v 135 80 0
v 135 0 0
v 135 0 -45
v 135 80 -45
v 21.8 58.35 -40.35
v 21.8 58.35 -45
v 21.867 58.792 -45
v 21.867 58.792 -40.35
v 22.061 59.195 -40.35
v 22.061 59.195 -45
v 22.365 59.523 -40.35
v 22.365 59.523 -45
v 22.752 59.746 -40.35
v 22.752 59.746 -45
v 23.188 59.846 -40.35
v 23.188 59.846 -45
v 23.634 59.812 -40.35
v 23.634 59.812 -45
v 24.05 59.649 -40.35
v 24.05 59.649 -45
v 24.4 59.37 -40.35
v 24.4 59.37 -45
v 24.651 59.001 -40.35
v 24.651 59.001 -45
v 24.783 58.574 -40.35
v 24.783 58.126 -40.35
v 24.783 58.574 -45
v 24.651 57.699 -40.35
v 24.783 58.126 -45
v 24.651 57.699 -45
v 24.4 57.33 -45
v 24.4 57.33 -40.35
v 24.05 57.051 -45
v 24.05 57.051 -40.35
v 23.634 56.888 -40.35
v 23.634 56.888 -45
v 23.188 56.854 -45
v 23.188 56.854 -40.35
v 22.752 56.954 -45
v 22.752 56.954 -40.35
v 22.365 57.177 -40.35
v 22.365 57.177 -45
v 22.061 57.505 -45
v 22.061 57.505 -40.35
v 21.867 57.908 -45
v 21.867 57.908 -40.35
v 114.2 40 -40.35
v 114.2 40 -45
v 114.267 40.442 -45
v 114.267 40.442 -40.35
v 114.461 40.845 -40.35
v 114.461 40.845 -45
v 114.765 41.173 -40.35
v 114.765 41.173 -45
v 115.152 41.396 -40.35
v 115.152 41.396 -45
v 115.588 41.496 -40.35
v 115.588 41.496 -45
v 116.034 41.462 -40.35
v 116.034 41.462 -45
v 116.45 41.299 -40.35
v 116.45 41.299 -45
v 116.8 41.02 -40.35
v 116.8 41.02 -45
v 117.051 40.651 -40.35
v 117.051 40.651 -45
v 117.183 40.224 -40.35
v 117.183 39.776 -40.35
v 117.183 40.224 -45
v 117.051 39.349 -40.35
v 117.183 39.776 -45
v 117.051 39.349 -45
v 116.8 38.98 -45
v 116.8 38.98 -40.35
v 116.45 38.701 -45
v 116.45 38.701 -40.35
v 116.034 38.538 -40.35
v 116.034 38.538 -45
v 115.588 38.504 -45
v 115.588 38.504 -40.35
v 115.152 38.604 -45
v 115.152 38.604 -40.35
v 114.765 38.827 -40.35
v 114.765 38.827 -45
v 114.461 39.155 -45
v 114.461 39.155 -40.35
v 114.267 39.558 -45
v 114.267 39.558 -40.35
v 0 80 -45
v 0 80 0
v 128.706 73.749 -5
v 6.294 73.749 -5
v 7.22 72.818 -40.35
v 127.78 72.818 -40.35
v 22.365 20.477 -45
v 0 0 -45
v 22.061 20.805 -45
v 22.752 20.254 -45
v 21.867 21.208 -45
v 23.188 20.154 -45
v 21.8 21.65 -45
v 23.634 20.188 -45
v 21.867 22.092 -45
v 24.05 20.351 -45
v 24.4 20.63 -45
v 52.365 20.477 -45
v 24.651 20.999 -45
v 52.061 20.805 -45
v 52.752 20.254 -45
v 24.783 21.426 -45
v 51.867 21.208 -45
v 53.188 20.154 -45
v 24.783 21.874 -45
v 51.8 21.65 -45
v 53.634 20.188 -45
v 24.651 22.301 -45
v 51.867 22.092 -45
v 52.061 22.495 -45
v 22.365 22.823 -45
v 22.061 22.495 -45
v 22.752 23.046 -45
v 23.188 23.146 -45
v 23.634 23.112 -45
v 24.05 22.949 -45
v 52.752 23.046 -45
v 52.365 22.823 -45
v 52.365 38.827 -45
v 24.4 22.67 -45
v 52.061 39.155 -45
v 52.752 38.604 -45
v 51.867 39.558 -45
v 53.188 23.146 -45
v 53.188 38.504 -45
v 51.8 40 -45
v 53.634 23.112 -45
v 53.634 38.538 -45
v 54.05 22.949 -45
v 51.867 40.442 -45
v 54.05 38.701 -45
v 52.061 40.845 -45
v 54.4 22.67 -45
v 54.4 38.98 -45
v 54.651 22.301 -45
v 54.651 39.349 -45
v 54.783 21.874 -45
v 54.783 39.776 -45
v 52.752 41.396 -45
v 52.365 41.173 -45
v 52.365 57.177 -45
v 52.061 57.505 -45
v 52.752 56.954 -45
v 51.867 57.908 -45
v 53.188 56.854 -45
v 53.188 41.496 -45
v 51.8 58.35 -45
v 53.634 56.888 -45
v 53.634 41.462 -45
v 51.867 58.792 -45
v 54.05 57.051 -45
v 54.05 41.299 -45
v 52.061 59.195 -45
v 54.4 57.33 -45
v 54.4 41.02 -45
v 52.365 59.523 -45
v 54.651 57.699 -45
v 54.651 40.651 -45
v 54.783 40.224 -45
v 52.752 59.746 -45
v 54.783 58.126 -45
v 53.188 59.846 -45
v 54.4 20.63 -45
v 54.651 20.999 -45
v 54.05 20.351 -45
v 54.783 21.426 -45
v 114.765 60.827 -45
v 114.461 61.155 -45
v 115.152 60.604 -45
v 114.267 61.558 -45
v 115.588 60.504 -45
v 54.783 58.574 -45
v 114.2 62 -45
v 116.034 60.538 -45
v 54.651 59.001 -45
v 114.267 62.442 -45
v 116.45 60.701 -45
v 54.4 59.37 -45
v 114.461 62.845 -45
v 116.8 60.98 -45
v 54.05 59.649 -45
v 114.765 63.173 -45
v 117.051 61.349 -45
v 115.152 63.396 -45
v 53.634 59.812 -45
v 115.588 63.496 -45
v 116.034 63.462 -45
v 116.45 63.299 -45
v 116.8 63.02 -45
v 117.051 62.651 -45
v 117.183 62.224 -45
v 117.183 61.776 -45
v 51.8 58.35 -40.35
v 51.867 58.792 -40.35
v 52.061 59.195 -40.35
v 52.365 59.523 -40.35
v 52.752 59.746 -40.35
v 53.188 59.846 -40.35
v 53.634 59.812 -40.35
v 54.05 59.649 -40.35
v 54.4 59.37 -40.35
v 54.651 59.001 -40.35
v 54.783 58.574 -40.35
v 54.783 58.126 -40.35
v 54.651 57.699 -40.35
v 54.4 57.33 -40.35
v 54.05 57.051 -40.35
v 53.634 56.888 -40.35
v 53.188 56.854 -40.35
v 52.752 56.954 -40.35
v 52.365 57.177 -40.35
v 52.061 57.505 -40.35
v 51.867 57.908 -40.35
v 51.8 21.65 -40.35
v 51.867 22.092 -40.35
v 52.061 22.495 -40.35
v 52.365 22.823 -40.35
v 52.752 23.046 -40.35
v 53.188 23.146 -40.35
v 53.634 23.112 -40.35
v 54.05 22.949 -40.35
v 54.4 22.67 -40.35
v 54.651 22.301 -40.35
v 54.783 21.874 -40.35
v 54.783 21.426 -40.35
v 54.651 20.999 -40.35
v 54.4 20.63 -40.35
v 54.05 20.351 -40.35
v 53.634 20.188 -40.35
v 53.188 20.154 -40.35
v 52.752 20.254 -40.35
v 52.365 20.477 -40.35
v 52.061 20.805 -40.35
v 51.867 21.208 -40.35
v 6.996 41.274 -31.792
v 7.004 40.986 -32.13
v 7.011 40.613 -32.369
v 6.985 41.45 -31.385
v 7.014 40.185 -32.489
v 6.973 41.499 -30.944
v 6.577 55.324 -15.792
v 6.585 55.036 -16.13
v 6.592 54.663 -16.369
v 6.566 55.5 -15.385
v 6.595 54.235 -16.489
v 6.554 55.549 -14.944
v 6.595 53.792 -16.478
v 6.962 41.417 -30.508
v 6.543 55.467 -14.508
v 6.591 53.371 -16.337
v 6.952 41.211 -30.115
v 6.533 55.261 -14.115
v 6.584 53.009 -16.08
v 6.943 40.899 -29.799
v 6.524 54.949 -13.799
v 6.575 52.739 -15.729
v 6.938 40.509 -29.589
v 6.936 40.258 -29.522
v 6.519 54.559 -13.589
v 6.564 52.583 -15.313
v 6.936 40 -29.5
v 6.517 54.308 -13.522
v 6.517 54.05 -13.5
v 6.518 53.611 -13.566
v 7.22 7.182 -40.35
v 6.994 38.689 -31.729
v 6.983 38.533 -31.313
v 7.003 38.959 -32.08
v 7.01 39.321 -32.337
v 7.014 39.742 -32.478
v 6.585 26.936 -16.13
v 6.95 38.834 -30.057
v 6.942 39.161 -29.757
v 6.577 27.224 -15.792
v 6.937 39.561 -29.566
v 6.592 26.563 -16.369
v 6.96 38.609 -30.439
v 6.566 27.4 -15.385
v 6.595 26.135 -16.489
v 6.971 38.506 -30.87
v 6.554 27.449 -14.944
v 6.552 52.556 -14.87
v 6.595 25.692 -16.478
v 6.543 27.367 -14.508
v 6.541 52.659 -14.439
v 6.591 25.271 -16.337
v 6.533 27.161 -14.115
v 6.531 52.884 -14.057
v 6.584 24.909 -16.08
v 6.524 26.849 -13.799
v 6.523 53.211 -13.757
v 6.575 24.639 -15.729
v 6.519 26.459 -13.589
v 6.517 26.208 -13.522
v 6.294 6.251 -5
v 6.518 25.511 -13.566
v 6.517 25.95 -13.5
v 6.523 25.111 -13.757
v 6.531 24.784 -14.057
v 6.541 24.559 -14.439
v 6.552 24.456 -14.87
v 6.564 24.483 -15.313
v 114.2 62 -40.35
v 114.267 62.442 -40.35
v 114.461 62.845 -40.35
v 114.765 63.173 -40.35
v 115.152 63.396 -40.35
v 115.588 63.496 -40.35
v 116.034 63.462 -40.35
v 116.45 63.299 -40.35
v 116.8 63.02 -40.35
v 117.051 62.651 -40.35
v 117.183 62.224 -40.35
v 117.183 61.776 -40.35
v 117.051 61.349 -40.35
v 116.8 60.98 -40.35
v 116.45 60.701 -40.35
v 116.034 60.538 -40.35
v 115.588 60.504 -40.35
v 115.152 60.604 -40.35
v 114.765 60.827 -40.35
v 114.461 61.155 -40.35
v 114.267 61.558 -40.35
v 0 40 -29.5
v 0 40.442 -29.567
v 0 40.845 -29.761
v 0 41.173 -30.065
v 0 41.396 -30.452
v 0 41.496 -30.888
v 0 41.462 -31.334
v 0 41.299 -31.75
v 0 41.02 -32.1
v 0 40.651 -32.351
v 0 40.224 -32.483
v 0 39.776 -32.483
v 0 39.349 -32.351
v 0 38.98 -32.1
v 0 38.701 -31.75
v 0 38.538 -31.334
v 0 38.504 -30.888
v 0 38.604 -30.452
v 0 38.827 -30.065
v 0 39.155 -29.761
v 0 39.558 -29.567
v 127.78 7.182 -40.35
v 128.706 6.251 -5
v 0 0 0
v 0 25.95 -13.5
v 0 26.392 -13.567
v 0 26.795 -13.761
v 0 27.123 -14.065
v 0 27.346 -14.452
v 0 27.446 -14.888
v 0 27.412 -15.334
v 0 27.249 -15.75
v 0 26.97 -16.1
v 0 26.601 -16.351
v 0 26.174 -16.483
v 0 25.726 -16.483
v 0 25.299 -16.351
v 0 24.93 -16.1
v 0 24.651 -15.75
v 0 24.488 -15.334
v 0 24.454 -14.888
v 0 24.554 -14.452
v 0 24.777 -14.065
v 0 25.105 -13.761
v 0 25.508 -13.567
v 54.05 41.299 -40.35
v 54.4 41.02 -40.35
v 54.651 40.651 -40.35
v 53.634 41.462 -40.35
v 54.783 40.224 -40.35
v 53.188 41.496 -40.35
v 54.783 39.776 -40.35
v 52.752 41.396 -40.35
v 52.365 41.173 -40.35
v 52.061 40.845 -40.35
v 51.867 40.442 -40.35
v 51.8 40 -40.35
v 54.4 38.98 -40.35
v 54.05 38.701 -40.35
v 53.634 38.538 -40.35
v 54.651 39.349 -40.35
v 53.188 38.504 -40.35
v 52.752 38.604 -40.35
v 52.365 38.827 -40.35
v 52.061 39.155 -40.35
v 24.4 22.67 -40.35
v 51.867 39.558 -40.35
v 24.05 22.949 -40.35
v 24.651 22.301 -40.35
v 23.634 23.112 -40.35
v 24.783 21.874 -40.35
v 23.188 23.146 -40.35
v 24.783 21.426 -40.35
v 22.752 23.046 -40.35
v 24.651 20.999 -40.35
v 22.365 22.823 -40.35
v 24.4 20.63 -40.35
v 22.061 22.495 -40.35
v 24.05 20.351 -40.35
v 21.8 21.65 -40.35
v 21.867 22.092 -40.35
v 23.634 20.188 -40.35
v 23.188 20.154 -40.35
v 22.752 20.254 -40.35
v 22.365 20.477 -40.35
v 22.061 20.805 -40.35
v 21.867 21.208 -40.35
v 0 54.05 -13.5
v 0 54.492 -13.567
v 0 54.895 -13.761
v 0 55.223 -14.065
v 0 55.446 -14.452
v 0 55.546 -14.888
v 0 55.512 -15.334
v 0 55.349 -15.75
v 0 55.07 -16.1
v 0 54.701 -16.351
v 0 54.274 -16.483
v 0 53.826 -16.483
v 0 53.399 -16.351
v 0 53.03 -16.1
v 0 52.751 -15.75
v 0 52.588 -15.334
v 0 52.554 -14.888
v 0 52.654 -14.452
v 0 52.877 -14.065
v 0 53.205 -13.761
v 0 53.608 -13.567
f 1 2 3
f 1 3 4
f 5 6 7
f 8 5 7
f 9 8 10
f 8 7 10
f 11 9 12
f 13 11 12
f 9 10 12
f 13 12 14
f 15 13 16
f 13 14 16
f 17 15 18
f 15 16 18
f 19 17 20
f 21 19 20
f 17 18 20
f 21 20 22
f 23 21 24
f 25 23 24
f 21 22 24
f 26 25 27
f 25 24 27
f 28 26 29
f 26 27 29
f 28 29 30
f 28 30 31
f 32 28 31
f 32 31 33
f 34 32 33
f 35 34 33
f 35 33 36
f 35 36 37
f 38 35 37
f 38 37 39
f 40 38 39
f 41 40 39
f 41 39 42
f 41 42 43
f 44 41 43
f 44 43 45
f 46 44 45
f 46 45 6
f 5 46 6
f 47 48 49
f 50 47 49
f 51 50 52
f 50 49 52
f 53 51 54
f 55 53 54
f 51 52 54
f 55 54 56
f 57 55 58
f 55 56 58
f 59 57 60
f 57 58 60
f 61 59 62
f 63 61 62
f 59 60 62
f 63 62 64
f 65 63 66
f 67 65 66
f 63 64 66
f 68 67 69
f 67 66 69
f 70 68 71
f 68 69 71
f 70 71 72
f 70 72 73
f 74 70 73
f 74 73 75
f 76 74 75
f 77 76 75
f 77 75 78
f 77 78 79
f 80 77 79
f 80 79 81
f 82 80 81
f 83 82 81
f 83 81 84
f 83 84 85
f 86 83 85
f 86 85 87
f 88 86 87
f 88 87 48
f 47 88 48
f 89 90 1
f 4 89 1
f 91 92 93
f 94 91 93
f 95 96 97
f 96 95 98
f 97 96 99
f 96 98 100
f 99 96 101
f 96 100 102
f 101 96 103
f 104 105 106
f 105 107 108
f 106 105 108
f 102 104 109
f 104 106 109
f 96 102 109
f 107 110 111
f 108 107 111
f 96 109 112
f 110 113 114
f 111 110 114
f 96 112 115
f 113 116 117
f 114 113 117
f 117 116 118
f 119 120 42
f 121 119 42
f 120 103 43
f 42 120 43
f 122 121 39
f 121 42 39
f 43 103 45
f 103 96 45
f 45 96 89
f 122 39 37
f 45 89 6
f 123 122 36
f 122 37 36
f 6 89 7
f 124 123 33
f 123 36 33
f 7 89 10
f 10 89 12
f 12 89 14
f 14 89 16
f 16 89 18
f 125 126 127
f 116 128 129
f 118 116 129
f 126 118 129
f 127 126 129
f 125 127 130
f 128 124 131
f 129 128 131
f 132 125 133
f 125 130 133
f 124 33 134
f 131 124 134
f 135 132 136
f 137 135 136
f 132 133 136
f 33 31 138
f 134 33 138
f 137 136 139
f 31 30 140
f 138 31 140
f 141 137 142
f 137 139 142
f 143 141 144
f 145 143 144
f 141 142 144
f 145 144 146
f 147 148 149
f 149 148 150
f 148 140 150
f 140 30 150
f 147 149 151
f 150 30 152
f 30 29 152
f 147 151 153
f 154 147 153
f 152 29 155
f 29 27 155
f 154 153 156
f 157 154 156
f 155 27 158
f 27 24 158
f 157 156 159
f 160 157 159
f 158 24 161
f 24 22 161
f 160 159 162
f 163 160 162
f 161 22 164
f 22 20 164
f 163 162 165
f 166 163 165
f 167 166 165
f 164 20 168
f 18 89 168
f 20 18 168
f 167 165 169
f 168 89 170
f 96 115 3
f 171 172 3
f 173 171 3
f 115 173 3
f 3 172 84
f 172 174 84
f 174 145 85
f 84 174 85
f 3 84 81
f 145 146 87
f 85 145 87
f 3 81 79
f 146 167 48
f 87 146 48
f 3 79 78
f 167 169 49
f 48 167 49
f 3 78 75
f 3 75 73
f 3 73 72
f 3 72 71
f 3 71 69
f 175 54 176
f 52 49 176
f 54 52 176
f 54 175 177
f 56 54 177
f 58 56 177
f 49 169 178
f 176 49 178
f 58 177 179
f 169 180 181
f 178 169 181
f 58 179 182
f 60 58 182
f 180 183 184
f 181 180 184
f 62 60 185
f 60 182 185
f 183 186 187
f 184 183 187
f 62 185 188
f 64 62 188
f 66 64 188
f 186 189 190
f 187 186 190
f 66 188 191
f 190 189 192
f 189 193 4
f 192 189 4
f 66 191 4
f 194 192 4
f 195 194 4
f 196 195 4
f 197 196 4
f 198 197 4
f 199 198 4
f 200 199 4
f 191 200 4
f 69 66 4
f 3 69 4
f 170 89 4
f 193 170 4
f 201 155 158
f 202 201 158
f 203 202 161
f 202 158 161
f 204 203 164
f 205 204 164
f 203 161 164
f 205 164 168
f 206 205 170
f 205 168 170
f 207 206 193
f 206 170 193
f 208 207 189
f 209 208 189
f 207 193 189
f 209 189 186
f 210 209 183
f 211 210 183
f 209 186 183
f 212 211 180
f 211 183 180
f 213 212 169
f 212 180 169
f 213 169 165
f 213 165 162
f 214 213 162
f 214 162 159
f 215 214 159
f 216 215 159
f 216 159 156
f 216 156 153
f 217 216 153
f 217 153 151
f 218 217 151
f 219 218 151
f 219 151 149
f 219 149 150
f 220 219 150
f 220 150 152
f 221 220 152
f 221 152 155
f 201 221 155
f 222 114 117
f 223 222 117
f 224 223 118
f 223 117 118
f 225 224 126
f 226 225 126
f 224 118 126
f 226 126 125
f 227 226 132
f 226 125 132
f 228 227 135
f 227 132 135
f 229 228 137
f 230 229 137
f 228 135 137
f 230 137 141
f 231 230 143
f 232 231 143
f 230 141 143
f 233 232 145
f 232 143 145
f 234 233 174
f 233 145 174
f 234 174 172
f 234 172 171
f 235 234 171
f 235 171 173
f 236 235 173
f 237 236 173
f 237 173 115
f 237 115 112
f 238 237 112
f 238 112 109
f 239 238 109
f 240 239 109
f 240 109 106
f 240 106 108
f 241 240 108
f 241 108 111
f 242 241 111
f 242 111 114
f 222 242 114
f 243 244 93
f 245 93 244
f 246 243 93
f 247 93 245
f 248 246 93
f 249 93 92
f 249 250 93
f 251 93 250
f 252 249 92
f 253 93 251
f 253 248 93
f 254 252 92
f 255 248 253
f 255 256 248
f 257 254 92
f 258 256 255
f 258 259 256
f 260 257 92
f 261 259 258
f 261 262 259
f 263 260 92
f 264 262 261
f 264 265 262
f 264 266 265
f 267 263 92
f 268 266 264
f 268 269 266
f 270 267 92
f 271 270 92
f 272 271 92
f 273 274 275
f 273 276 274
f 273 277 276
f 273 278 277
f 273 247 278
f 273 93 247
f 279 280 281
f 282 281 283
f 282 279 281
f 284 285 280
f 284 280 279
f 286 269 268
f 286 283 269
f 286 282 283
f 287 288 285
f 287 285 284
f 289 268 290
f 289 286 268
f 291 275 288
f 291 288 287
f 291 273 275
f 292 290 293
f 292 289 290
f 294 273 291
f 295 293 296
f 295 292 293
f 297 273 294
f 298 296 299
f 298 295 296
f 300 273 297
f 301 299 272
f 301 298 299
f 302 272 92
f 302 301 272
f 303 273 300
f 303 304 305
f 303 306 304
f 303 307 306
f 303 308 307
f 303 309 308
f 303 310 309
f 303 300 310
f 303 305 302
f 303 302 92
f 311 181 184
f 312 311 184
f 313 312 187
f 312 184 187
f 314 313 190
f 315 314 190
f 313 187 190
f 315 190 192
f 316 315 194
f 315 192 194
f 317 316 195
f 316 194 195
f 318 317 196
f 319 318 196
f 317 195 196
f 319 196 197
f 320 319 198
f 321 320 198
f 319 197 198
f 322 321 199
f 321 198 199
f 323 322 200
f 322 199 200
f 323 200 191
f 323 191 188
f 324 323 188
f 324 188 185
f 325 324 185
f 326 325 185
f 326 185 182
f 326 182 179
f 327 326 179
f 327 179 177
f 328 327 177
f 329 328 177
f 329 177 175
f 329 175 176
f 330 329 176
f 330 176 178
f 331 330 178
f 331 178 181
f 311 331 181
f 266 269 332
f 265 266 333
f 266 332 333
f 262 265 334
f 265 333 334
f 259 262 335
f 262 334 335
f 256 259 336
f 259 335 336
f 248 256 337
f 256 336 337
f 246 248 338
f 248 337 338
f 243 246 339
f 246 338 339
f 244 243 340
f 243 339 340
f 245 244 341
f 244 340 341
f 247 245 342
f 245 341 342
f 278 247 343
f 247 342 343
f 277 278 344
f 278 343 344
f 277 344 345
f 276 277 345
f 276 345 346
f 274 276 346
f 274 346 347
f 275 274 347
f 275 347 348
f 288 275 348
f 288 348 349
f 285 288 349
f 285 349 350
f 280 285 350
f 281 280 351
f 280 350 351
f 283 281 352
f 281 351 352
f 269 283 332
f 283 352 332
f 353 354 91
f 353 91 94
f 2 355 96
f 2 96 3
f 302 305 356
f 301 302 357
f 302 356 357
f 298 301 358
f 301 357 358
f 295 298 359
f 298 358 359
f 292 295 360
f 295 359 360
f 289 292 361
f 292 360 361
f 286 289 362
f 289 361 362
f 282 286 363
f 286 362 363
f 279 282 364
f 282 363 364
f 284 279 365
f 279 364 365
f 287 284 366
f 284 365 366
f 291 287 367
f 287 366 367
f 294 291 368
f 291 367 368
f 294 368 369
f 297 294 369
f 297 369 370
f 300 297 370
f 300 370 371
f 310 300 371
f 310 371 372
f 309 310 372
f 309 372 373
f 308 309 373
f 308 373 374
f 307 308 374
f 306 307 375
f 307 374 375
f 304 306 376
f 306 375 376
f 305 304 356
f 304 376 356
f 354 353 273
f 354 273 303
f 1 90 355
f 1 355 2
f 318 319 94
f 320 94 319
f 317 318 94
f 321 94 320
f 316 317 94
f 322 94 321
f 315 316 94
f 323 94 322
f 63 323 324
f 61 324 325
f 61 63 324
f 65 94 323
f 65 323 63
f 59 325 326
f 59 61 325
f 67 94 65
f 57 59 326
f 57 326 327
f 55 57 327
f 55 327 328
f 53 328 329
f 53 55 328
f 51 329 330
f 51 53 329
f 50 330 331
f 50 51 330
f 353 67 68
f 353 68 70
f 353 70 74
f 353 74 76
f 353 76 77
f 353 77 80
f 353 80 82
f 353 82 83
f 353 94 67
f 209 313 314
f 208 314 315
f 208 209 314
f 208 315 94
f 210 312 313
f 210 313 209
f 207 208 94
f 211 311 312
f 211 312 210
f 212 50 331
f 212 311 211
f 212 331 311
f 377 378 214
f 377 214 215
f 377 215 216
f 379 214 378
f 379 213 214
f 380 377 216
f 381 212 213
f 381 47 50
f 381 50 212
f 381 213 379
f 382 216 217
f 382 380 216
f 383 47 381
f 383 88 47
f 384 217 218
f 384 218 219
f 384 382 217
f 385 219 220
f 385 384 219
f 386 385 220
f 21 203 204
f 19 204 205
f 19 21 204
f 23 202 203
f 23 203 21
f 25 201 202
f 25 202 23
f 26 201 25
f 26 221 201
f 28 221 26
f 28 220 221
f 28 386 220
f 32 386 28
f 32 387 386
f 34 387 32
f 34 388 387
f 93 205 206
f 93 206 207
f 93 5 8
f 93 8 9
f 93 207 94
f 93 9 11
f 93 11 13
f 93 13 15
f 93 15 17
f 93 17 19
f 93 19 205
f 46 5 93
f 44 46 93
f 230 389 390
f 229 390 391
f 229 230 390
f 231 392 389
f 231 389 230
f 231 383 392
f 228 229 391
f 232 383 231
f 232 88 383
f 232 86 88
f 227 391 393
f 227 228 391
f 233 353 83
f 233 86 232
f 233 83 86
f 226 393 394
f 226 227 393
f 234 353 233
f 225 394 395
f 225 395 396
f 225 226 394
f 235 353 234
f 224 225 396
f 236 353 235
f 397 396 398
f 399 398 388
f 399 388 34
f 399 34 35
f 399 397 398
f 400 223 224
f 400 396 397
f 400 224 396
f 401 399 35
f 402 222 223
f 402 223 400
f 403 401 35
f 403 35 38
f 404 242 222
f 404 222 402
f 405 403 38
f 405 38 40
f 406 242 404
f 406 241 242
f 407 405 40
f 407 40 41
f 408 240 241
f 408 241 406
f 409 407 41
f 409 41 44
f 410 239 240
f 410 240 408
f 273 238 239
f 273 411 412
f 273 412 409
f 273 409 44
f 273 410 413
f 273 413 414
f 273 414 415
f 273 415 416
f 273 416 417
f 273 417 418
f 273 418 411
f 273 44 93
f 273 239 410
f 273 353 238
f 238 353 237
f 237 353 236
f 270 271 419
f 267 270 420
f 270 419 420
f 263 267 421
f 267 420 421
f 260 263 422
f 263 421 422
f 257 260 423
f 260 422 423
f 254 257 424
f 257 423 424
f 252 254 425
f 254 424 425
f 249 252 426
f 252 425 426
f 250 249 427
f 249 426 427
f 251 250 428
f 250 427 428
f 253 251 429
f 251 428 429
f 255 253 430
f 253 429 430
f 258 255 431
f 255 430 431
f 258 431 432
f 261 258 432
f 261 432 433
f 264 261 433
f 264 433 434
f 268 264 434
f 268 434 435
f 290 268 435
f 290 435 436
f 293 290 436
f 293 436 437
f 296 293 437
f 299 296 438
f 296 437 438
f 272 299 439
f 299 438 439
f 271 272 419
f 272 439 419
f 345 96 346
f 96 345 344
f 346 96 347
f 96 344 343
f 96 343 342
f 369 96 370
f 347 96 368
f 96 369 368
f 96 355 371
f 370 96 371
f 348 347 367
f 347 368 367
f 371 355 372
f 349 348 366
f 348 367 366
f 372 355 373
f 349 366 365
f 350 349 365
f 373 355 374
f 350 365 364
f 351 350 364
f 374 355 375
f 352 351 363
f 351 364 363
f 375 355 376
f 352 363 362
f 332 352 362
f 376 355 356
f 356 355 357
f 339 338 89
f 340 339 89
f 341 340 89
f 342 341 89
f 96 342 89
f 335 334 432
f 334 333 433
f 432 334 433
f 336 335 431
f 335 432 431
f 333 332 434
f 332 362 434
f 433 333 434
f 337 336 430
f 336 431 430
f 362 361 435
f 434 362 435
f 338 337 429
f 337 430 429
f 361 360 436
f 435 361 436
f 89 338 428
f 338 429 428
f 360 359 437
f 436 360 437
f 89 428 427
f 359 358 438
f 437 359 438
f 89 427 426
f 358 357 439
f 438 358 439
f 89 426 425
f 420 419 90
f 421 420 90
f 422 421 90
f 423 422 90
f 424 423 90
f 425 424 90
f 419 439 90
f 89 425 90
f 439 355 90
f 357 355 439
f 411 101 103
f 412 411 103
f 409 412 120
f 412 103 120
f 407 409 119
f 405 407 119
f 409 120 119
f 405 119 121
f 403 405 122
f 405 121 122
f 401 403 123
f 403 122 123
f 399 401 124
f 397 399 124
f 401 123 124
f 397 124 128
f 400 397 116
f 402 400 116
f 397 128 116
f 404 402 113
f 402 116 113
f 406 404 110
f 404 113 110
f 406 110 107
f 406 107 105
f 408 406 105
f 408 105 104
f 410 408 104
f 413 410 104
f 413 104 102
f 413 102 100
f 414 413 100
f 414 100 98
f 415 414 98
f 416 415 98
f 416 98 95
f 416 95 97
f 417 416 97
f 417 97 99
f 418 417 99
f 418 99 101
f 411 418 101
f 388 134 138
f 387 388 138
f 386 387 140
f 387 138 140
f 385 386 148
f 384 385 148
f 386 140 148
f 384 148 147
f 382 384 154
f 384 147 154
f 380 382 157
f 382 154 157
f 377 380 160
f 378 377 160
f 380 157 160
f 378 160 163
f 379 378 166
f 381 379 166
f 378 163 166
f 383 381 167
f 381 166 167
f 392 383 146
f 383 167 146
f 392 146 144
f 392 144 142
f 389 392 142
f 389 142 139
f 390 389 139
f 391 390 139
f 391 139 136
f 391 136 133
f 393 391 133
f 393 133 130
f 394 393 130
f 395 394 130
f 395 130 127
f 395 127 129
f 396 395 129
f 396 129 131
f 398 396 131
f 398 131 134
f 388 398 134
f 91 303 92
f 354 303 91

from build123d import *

# Parameters (mm, degrees)
SKETCH1_W           = 135
SKETCH1_H           = 80
BOSS_EXTRUDE1_DEPTH = 45
SKETCH2_R           = 1.5
CUT_EXTRUDE1_DEPTH  = 10
SKETCH3_R           = 1.5
CUT_EXTRUDE2_DEPTH  = 10
CAVITY1_START       = 6.25125
CAVITY1_DEPTH       = 67.4975
CAVITY1_START_2     = 5
CAVITY1_2_DEPTH     = 125


with BuildPart() as part:
    # Sketch1 → Boss-Extrude1 (new body)
    with BuildSketch(Plane.XY):
        with Locations((67.5, 40)):
            Rectangle(SKETCH1_W, SKETCH1_H)
    extrude(amount=-BOSS_EXTRUDE1_DEPTH)

    # Sketch2 → Cut-Extrude1 (cut)
    with BuildSketch(Plane(origin=(0, 0, -45), x_dir=(-1, 0, 0), z_dir=(0, 0, -1))):
        with Locations((-53.3, 40)):
            Circle(SKETCH2_R)
        with Locations((-53.3, 58.35)):
            Circle(SKETCH2_R)
        with Locations((-53.3, 21.65)):
            Circle(SKETCH2_R)
        with Locations((-23.3, 58.35)):
            Circle(SKETCH2_R)
        with Locations((-23.3, 21.65)):
            Circle(SKETCH2_R)
        with Locations((-115.7, 40)):
            Circle(SKETCH2_R)
        with Locations((-115.7, 62)):
            Circle(SKETCH2_R)
    extrude(amount=-CUT_EXTRUDE1_DEPTH, mode=Mode.SUBTRACT)

    # Sketch3 → Cut-Extrude2 (cut)
    with BuildSketch(Plane.ZY):
        with Locations((-15, 54.05)):
            Circle(SKETCH3_R)
        with Locations((-15, 25.95)):
            Circle(SKETCH3_R)
        with Locations((-31, 40)):
            Circle(SKETCH3_R)
    extrude(amount=-CUT_EXTRUDE2_DEPTH, mode=Mode.SUBTRACT)

    # Cavity1: read off the stored shape, not the designer's step
    # Cavity1 outline → Cavity1 (cut)
    with BuildSketch(Plane(origin=(0, 0, 0), x_dir=(1, 0, 0), z_dir=(0, 1, 0)).offset(CAVITY1_START)):
        Polygon((127.780327673, 40.35), (7.219672327, 40.35), (6.294, 5), (128.706, 5), align=None)
    extrude(amount=CAVITY1_DEPTH, mode=Mode.SUBTRACT)

    # Cavity1 2 outline → Cavity1 2 (add)
    with BuildSketch(Plane.YZ.offset(CAVITY1_START_2)):
        Polygon((73.74875, -5), (72.818495136, -40.35), (73.74875, -40.35), align=None)
        Polygon((7.181504864, -40.35), (6.25125, -5), (6.25125, -40.35), align=None)
    extrude(amount=CAVITY1_2_DEPTH)


solid = part.part
